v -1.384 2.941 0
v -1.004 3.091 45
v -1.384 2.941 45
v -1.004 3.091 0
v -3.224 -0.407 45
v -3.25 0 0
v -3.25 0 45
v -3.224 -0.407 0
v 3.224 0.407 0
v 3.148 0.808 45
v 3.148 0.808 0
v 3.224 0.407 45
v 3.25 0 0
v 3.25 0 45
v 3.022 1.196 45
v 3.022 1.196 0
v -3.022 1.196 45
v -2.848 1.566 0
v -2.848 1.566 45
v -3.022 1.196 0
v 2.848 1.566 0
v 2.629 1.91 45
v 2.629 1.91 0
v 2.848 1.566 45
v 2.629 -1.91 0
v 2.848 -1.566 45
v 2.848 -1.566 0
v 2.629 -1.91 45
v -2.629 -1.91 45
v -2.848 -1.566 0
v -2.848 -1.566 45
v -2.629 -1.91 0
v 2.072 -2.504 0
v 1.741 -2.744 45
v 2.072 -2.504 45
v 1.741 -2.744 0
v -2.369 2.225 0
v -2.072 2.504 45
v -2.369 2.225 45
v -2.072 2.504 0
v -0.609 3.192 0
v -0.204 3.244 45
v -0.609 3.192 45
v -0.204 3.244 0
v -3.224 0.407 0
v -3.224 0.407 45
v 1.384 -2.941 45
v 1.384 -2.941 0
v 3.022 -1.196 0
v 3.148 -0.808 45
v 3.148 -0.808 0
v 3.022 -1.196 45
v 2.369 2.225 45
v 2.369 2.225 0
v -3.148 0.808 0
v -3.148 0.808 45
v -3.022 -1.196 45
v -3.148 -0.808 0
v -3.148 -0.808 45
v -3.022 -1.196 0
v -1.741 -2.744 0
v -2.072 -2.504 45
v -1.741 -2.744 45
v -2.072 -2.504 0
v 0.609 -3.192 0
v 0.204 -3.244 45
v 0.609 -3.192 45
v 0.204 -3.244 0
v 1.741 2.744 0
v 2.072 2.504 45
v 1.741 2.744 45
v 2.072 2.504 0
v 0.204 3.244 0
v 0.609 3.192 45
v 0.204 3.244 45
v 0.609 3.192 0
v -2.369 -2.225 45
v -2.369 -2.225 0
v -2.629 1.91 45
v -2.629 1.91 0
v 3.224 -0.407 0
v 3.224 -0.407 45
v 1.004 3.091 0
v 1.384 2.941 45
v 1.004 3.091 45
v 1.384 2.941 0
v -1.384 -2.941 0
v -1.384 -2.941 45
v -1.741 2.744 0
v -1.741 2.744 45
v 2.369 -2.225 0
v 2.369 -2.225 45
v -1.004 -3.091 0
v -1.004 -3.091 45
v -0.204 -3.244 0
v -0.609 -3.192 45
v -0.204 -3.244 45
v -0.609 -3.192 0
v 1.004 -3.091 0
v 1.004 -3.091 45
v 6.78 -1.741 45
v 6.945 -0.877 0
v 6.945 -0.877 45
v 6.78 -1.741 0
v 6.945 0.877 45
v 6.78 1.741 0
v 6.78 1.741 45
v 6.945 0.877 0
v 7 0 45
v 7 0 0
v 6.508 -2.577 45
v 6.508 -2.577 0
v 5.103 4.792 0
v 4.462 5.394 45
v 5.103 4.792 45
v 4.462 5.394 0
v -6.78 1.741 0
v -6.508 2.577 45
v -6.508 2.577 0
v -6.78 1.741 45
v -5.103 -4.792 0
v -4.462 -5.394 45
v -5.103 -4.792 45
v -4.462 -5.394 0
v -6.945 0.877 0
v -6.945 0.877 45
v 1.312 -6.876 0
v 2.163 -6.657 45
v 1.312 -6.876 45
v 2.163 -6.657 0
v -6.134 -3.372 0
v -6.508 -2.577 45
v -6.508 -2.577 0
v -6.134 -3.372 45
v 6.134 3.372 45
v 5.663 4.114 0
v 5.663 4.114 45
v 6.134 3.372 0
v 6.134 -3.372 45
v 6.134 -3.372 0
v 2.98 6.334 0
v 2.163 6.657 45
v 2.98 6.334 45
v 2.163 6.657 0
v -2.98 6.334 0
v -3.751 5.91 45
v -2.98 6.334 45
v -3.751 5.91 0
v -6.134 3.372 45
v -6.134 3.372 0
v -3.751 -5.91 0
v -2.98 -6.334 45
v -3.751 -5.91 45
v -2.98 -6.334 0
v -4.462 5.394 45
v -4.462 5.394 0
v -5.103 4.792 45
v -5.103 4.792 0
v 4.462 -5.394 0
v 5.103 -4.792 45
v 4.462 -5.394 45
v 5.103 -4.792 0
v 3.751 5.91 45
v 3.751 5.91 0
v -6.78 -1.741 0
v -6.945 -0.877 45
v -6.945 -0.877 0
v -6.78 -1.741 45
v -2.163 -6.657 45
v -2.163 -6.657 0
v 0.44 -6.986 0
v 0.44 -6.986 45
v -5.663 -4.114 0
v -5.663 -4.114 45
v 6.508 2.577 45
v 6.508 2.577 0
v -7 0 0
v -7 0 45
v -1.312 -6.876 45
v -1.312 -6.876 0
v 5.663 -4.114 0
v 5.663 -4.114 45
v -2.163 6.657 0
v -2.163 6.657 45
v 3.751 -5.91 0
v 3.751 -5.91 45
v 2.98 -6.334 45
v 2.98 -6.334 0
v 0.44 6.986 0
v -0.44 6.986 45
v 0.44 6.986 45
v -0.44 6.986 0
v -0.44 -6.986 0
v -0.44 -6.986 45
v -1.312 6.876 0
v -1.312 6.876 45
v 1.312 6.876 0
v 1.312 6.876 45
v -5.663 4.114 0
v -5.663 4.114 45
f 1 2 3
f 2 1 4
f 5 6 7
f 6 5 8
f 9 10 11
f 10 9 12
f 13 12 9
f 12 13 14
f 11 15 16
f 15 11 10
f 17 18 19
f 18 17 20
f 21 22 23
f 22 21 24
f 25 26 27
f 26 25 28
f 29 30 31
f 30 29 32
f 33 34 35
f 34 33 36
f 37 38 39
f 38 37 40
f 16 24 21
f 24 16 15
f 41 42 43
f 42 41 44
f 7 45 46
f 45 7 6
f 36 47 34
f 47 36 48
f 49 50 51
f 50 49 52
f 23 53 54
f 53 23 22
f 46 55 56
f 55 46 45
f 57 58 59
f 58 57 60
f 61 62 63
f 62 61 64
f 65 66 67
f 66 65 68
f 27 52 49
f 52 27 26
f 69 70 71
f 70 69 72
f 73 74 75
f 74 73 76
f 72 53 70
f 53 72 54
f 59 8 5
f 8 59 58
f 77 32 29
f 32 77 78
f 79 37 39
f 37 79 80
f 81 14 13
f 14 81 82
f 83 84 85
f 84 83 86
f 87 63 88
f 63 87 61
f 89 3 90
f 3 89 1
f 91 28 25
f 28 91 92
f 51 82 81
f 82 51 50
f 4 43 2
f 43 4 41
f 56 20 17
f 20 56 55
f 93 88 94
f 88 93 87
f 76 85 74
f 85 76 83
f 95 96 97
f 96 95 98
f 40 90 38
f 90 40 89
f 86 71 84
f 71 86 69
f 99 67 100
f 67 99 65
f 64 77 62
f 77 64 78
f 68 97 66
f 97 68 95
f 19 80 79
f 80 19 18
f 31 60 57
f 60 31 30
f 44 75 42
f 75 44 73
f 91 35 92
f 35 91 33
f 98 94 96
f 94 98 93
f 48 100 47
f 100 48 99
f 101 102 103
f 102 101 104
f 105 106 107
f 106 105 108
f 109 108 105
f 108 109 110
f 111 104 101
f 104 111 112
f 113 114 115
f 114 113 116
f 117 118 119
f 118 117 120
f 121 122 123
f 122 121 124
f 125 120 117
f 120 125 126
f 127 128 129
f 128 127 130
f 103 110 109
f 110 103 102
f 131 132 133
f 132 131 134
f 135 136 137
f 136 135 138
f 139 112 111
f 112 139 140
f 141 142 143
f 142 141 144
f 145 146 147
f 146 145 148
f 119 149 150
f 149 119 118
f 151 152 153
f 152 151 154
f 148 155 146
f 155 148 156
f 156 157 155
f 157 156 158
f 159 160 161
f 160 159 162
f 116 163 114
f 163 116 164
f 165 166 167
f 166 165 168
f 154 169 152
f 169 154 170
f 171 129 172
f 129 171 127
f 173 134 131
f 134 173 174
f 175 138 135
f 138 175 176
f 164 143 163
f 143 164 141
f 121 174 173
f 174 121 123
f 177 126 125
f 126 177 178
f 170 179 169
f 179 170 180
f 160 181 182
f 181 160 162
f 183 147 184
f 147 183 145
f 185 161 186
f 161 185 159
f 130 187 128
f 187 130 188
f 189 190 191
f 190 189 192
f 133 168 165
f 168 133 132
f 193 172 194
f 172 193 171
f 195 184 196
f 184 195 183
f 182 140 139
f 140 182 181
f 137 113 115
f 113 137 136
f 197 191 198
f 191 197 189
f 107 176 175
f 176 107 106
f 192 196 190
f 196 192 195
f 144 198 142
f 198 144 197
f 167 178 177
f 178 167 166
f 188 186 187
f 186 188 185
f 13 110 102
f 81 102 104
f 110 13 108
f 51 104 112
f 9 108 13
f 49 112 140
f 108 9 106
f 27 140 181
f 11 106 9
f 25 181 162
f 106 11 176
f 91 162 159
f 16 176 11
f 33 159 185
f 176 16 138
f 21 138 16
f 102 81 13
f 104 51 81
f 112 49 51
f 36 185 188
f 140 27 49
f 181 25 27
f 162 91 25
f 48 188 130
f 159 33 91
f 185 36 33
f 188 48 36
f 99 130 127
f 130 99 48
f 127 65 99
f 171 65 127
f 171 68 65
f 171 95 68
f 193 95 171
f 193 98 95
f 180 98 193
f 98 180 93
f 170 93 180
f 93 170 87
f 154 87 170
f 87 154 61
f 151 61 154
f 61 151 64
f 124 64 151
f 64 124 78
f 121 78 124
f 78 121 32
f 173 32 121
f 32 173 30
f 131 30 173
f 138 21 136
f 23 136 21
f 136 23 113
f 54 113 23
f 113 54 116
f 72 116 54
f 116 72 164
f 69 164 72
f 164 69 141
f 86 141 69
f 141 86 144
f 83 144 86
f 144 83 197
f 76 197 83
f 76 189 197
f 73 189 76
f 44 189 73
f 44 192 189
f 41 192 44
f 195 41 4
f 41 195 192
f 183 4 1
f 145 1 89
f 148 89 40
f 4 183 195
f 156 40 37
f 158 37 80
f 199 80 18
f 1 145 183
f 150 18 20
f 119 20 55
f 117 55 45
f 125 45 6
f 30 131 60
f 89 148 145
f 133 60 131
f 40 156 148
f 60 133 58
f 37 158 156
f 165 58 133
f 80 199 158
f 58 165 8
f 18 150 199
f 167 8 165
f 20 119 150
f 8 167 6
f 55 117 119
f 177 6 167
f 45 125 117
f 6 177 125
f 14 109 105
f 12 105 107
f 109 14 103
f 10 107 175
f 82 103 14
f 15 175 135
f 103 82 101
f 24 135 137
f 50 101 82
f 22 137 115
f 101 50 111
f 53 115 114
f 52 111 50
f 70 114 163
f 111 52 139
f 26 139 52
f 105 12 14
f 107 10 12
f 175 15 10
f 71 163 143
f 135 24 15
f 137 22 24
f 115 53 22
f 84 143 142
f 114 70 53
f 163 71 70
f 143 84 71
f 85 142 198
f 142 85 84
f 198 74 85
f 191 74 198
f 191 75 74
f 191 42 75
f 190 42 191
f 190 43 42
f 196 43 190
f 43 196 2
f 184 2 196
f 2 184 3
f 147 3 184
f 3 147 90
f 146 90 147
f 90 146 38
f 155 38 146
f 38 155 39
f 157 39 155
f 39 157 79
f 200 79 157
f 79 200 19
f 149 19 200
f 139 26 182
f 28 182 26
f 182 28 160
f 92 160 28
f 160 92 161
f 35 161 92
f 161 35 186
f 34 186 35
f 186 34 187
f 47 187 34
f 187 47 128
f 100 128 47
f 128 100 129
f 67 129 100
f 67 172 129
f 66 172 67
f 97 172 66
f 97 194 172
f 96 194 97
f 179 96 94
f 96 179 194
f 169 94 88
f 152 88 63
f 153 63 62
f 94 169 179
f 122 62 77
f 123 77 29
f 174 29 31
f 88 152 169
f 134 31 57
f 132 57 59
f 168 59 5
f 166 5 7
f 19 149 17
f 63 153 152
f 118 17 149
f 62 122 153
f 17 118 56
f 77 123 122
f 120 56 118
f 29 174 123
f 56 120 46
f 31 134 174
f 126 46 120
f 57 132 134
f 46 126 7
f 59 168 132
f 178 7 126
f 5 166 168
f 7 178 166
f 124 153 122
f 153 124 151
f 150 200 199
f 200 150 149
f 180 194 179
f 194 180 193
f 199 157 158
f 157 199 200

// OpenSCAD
$fn = 50;


difference() {
	union() {
		cylinder(h = 45, r = 7.0000000000);
	}
	union() {
		translate(v = [0.0000000000, 0.0000000000, -100.0000000000]) {
			cylinder(h = 200, r = 3.2500000000);
		}
		cylinder(h = 45, r = 1.8000000000);
		cylinder(h = 45, r = 1.8000000000);
		cylinder(h = 45, r = 1.8000000000);
	}
}
